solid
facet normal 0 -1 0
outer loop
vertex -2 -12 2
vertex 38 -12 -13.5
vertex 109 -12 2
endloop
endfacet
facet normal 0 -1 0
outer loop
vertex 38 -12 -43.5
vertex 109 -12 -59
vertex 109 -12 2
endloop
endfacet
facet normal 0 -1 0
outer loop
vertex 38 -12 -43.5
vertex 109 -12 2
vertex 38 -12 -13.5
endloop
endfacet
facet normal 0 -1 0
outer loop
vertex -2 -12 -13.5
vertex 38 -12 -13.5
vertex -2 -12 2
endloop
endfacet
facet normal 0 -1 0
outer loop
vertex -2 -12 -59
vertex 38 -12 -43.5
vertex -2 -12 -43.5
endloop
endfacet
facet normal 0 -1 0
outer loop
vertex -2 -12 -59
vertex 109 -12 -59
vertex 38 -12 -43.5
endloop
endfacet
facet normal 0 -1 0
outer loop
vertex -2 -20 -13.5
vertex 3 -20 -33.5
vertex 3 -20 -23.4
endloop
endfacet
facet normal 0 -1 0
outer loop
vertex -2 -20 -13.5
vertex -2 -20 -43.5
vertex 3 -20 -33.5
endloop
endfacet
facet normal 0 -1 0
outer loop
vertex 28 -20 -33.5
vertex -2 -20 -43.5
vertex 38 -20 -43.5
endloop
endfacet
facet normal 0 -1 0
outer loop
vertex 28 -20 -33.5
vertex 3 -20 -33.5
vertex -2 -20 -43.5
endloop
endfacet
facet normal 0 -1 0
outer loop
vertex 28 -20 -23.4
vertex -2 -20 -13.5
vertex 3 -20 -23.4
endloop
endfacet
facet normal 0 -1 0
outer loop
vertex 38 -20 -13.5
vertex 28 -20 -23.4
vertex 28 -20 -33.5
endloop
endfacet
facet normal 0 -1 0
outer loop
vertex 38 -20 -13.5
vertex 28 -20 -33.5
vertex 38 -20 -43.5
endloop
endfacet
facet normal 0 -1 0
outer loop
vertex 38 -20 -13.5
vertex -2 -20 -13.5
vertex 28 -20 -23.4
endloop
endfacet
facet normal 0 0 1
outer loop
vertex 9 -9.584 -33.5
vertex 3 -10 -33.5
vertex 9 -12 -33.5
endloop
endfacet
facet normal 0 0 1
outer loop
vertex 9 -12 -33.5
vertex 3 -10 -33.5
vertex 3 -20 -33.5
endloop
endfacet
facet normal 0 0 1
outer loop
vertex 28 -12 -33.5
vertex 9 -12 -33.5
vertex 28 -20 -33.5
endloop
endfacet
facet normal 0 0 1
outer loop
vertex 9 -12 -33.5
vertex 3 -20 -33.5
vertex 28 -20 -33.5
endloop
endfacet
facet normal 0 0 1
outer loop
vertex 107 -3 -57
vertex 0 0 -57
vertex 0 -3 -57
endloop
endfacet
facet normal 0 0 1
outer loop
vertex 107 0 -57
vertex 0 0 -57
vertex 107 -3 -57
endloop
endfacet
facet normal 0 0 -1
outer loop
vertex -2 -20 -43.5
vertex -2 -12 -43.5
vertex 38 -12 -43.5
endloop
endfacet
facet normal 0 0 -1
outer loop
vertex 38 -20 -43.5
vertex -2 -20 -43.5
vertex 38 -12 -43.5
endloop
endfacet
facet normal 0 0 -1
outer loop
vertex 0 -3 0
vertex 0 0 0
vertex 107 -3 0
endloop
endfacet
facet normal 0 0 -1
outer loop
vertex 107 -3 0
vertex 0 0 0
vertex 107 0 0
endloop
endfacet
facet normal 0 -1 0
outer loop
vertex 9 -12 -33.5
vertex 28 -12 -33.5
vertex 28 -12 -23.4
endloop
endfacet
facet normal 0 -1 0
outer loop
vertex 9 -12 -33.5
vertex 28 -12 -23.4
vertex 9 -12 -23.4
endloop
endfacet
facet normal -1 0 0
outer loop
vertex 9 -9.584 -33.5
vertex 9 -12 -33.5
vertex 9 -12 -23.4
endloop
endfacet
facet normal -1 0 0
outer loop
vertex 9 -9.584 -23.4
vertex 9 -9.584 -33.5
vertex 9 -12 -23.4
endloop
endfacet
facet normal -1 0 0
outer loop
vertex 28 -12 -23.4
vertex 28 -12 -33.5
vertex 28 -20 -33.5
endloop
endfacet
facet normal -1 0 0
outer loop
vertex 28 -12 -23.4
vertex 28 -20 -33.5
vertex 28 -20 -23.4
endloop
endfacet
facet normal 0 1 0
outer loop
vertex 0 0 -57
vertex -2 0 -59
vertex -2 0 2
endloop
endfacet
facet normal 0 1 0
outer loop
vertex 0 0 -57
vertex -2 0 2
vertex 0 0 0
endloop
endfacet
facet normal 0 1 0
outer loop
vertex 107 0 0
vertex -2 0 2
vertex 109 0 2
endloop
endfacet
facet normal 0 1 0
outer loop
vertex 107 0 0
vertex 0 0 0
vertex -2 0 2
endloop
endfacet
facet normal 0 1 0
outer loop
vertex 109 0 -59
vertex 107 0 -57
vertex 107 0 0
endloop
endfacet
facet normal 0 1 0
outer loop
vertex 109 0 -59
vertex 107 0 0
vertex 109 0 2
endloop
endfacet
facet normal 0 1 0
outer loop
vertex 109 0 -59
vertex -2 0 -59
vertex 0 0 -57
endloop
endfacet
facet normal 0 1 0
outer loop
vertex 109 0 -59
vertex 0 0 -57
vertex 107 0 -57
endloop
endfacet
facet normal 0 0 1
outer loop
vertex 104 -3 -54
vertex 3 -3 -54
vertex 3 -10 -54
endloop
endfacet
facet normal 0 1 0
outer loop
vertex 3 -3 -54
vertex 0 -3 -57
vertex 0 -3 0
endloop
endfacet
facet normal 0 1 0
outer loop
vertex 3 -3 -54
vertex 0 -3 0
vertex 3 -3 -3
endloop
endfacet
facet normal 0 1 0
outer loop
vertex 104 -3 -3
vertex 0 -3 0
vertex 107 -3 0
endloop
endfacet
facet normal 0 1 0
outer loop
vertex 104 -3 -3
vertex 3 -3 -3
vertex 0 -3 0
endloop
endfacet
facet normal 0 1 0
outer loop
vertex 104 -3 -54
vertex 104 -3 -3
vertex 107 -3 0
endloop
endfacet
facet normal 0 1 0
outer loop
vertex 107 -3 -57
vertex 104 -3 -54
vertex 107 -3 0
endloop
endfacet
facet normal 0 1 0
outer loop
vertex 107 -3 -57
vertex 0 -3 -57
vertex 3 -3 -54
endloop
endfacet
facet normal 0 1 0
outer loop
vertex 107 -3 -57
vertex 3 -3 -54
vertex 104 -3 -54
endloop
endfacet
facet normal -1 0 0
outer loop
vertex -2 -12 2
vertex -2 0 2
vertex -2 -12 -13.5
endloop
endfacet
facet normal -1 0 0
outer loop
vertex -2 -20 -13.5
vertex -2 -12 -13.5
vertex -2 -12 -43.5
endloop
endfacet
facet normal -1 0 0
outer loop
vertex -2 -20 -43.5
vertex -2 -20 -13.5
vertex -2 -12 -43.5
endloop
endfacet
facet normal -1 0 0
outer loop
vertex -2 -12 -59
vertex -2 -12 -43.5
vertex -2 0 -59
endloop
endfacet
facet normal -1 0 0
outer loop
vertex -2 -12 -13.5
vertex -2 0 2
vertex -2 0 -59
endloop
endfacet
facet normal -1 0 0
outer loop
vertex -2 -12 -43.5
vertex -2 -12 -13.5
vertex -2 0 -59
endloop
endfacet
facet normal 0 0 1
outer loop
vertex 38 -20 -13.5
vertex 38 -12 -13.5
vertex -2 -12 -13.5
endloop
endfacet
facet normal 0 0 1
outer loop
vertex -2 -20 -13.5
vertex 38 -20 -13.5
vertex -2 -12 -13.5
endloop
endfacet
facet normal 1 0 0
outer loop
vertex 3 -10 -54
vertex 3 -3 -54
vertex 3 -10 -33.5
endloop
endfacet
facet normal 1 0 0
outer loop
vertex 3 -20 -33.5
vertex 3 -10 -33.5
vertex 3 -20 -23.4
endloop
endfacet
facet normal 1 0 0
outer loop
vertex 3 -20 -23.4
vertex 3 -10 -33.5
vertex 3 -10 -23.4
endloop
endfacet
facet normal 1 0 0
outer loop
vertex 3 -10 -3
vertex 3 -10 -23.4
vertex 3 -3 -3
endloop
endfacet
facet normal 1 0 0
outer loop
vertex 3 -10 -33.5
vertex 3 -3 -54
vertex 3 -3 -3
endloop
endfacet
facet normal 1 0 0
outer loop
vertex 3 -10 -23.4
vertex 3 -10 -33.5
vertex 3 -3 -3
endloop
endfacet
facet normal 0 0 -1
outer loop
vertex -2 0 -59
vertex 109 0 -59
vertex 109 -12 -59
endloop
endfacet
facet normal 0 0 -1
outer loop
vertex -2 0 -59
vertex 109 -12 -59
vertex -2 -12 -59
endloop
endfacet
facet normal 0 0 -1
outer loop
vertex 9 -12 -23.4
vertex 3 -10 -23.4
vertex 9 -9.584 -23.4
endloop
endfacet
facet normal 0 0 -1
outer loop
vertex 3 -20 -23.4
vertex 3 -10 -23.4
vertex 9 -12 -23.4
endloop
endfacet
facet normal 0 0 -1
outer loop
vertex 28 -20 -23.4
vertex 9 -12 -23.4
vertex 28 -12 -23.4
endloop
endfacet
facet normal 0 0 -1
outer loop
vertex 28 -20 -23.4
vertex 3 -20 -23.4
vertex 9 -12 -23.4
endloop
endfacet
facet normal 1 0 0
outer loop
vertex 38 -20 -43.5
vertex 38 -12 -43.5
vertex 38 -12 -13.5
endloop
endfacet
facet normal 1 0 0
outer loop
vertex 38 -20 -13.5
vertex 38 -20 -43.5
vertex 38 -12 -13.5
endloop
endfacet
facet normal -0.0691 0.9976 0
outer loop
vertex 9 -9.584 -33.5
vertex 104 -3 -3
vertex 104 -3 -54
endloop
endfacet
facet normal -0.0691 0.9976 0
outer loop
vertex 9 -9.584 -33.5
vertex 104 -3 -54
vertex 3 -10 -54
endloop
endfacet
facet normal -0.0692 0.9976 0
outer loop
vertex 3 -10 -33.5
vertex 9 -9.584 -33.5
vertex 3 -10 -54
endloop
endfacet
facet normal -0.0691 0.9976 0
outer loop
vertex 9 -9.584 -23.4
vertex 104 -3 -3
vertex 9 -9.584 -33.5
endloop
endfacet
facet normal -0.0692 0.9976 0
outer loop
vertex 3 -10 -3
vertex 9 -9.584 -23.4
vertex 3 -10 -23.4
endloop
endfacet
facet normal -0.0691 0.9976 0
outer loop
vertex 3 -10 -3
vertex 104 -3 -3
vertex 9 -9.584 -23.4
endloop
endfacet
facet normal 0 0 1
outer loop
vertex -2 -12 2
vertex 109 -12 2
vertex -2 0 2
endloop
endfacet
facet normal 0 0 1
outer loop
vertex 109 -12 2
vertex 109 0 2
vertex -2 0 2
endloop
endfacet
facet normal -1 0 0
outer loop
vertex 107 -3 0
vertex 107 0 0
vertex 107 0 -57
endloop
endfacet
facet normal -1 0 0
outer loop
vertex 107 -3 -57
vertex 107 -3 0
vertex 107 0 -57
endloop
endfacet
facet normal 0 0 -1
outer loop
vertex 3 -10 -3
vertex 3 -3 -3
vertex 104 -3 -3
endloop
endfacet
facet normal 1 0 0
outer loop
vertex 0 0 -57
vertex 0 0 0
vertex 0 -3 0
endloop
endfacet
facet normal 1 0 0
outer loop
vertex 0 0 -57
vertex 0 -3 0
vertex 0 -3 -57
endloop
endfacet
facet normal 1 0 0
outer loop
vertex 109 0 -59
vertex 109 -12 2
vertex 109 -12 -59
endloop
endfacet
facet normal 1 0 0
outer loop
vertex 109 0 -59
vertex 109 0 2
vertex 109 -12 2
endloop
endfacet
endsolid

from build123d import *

# Parameters (mm, degrees)
SKETCH_1_W          = 111
SKETCH_1_H          = 61
SKETCH_1_W_2        = 107
SKETCH_1_H_2        = 57
EXTRUDE_1_DEPTH     = 10
SKETCH_3_W          = 111
SKETCH_3_H          = 61
EXTRUDE_1_2_DEPTH   = 2
SKETCH_5_W          = 27.999833333
SKETCH_5_H          = 10.1
EXTRUDE_2_DEPTH     = 8
EXTRUDE_3_REACH     = 127.104
SKETCH_6_W          = 107
SKETCH_6_H          = 57
SKETCH_6_W_2        = 101
SKETCH_6_H_2        = 51
EXTRUDE_4_REACH     = 126.165
SKETCH_8_W          = 6
SKETCH_8_H          = 10.1
CUT_EXTRUDE_1_DEPTH = 10
SKETCH_9_W          = 3
SKETCH_9_H          = 10.1
EXTRUDE_7_DEPTH     = 8


with BuildPart() as part:
    # 草圖1 → Extrude 1 (new body)
    with BuildSketch(Plane(origin=(0, 0, 0), x_dir=(1, 0, 0), z_dir=(0, 1, 0))):
        with Locations((53.5, 28.5)):
            Rectangle(SKETCH_1_W, SKETCH_1_H)
        with Locations((53.5, 28.5)):
            Rectangle(SKETCH_1_W_2, SKETCH_1_H_2, mode=Mode.SUBTRACT)
    extrude(amount=-EXTRUDE_1_DEPTH)

    # 草圖3 → Extrude 1 2 (add)
    with BuildSketch(Plane(origin=(0, -10, 0), x_dir=(-1, 0, 0), z_dir=(0, -1, 0))):
        with Locations((-53.5, 28.5)):
            Rectangle(SKETCH_3_W, SKETCH_3_H)
    extrude(amount=EXTRUDE_1_2_DEPTH)

    # 草圖5 → 填料-伸長2 (add)
    with BuildSketch(Plane.XZ.offset(12)):
        Polygon((-2, -23.5), (-2, -33.5), (-2, -43.5), (37.999833333, -43.5), (37.999833333, -13.5), (-2, -13.5), align=None)
        with Locations((13.999916667, -28.45)):
            Rectangle(SKETCH_5_W, SKETCH_5_H, mode=Mode.SUBTRACT)
    extrude(amount=EXTRUDE_2_DEPTH)

    # 草圖6 → 填料-伸長3 (add, up to next)
    with BuildSketch(Plane(origin=(0, -3, 0), x_dir=(1, 0, 0), z_dir=(0, 1, 0)), mode=Mode.PRIVATE) as extrude_3_sk1:
        with Locations((53.5, 28.5)):
            Rectangle(SKETCH_6_W, SKETCH_6_H)
        with Locations((53.5, 28.5)):
            Rectangle(SKETCH_6_W_2, SKETCH_6_H_2, mode=Mode.SUBTRACT)
    extrude_3_tool1 = extrude(extrude_3_sk1.sketch, amount=-EXTRUDE_3_REACH, mode=Mode.PRIVATE) - part.part
    add(extrude_3_tool1.solids().sort_by_distance((105.787647, -3, -28.5))[0])

    # 草圖7 → 填料-伸長4 (add, up to next)
    with BuildSketch(Plane(origin=(0, 0, -3), x_dir=(-1, 0, 0), z_dir=(0, 0, -1)), mode=Mode.PRIVATE) as extrude_4_sk1:
        Polygon((-104, -3), (-3, -10), (-104, -10), align=None)
    extrude_4_tool1 = extrude(extrude_4_sk1.sketch, amount=EXTRUDE_4_REACH, mode=Mode.PRIVATE) - part.part
    add(extrude_4_tool1.solids().sort_by_distance((70.333333, -7.666667, -3))[0])

    # 草圖8 → 除料-伸長1 (cut)
    with BuildSketch(Plane.XZ.offset(12)):
        with Locations((6, -28.45)):
            Rectangle(SKETCH_8_W, SKETCH_8_H)
    extrude(amount=-CUT_EXTRUDE_1_DEPTH, mode=Mode.SUBTRACT)

    # 草圖9 → 填料-伸長7 (add)
    with BuildSketch(Plane.XZ.offset(12)):
        with Locations((1.5, -28.45)):
            Rectangle(SKETCH_9_W, SKETCH_9_H)
    extrude(amount=EXTRUDE_7_DEPTH)


solid = part.part
